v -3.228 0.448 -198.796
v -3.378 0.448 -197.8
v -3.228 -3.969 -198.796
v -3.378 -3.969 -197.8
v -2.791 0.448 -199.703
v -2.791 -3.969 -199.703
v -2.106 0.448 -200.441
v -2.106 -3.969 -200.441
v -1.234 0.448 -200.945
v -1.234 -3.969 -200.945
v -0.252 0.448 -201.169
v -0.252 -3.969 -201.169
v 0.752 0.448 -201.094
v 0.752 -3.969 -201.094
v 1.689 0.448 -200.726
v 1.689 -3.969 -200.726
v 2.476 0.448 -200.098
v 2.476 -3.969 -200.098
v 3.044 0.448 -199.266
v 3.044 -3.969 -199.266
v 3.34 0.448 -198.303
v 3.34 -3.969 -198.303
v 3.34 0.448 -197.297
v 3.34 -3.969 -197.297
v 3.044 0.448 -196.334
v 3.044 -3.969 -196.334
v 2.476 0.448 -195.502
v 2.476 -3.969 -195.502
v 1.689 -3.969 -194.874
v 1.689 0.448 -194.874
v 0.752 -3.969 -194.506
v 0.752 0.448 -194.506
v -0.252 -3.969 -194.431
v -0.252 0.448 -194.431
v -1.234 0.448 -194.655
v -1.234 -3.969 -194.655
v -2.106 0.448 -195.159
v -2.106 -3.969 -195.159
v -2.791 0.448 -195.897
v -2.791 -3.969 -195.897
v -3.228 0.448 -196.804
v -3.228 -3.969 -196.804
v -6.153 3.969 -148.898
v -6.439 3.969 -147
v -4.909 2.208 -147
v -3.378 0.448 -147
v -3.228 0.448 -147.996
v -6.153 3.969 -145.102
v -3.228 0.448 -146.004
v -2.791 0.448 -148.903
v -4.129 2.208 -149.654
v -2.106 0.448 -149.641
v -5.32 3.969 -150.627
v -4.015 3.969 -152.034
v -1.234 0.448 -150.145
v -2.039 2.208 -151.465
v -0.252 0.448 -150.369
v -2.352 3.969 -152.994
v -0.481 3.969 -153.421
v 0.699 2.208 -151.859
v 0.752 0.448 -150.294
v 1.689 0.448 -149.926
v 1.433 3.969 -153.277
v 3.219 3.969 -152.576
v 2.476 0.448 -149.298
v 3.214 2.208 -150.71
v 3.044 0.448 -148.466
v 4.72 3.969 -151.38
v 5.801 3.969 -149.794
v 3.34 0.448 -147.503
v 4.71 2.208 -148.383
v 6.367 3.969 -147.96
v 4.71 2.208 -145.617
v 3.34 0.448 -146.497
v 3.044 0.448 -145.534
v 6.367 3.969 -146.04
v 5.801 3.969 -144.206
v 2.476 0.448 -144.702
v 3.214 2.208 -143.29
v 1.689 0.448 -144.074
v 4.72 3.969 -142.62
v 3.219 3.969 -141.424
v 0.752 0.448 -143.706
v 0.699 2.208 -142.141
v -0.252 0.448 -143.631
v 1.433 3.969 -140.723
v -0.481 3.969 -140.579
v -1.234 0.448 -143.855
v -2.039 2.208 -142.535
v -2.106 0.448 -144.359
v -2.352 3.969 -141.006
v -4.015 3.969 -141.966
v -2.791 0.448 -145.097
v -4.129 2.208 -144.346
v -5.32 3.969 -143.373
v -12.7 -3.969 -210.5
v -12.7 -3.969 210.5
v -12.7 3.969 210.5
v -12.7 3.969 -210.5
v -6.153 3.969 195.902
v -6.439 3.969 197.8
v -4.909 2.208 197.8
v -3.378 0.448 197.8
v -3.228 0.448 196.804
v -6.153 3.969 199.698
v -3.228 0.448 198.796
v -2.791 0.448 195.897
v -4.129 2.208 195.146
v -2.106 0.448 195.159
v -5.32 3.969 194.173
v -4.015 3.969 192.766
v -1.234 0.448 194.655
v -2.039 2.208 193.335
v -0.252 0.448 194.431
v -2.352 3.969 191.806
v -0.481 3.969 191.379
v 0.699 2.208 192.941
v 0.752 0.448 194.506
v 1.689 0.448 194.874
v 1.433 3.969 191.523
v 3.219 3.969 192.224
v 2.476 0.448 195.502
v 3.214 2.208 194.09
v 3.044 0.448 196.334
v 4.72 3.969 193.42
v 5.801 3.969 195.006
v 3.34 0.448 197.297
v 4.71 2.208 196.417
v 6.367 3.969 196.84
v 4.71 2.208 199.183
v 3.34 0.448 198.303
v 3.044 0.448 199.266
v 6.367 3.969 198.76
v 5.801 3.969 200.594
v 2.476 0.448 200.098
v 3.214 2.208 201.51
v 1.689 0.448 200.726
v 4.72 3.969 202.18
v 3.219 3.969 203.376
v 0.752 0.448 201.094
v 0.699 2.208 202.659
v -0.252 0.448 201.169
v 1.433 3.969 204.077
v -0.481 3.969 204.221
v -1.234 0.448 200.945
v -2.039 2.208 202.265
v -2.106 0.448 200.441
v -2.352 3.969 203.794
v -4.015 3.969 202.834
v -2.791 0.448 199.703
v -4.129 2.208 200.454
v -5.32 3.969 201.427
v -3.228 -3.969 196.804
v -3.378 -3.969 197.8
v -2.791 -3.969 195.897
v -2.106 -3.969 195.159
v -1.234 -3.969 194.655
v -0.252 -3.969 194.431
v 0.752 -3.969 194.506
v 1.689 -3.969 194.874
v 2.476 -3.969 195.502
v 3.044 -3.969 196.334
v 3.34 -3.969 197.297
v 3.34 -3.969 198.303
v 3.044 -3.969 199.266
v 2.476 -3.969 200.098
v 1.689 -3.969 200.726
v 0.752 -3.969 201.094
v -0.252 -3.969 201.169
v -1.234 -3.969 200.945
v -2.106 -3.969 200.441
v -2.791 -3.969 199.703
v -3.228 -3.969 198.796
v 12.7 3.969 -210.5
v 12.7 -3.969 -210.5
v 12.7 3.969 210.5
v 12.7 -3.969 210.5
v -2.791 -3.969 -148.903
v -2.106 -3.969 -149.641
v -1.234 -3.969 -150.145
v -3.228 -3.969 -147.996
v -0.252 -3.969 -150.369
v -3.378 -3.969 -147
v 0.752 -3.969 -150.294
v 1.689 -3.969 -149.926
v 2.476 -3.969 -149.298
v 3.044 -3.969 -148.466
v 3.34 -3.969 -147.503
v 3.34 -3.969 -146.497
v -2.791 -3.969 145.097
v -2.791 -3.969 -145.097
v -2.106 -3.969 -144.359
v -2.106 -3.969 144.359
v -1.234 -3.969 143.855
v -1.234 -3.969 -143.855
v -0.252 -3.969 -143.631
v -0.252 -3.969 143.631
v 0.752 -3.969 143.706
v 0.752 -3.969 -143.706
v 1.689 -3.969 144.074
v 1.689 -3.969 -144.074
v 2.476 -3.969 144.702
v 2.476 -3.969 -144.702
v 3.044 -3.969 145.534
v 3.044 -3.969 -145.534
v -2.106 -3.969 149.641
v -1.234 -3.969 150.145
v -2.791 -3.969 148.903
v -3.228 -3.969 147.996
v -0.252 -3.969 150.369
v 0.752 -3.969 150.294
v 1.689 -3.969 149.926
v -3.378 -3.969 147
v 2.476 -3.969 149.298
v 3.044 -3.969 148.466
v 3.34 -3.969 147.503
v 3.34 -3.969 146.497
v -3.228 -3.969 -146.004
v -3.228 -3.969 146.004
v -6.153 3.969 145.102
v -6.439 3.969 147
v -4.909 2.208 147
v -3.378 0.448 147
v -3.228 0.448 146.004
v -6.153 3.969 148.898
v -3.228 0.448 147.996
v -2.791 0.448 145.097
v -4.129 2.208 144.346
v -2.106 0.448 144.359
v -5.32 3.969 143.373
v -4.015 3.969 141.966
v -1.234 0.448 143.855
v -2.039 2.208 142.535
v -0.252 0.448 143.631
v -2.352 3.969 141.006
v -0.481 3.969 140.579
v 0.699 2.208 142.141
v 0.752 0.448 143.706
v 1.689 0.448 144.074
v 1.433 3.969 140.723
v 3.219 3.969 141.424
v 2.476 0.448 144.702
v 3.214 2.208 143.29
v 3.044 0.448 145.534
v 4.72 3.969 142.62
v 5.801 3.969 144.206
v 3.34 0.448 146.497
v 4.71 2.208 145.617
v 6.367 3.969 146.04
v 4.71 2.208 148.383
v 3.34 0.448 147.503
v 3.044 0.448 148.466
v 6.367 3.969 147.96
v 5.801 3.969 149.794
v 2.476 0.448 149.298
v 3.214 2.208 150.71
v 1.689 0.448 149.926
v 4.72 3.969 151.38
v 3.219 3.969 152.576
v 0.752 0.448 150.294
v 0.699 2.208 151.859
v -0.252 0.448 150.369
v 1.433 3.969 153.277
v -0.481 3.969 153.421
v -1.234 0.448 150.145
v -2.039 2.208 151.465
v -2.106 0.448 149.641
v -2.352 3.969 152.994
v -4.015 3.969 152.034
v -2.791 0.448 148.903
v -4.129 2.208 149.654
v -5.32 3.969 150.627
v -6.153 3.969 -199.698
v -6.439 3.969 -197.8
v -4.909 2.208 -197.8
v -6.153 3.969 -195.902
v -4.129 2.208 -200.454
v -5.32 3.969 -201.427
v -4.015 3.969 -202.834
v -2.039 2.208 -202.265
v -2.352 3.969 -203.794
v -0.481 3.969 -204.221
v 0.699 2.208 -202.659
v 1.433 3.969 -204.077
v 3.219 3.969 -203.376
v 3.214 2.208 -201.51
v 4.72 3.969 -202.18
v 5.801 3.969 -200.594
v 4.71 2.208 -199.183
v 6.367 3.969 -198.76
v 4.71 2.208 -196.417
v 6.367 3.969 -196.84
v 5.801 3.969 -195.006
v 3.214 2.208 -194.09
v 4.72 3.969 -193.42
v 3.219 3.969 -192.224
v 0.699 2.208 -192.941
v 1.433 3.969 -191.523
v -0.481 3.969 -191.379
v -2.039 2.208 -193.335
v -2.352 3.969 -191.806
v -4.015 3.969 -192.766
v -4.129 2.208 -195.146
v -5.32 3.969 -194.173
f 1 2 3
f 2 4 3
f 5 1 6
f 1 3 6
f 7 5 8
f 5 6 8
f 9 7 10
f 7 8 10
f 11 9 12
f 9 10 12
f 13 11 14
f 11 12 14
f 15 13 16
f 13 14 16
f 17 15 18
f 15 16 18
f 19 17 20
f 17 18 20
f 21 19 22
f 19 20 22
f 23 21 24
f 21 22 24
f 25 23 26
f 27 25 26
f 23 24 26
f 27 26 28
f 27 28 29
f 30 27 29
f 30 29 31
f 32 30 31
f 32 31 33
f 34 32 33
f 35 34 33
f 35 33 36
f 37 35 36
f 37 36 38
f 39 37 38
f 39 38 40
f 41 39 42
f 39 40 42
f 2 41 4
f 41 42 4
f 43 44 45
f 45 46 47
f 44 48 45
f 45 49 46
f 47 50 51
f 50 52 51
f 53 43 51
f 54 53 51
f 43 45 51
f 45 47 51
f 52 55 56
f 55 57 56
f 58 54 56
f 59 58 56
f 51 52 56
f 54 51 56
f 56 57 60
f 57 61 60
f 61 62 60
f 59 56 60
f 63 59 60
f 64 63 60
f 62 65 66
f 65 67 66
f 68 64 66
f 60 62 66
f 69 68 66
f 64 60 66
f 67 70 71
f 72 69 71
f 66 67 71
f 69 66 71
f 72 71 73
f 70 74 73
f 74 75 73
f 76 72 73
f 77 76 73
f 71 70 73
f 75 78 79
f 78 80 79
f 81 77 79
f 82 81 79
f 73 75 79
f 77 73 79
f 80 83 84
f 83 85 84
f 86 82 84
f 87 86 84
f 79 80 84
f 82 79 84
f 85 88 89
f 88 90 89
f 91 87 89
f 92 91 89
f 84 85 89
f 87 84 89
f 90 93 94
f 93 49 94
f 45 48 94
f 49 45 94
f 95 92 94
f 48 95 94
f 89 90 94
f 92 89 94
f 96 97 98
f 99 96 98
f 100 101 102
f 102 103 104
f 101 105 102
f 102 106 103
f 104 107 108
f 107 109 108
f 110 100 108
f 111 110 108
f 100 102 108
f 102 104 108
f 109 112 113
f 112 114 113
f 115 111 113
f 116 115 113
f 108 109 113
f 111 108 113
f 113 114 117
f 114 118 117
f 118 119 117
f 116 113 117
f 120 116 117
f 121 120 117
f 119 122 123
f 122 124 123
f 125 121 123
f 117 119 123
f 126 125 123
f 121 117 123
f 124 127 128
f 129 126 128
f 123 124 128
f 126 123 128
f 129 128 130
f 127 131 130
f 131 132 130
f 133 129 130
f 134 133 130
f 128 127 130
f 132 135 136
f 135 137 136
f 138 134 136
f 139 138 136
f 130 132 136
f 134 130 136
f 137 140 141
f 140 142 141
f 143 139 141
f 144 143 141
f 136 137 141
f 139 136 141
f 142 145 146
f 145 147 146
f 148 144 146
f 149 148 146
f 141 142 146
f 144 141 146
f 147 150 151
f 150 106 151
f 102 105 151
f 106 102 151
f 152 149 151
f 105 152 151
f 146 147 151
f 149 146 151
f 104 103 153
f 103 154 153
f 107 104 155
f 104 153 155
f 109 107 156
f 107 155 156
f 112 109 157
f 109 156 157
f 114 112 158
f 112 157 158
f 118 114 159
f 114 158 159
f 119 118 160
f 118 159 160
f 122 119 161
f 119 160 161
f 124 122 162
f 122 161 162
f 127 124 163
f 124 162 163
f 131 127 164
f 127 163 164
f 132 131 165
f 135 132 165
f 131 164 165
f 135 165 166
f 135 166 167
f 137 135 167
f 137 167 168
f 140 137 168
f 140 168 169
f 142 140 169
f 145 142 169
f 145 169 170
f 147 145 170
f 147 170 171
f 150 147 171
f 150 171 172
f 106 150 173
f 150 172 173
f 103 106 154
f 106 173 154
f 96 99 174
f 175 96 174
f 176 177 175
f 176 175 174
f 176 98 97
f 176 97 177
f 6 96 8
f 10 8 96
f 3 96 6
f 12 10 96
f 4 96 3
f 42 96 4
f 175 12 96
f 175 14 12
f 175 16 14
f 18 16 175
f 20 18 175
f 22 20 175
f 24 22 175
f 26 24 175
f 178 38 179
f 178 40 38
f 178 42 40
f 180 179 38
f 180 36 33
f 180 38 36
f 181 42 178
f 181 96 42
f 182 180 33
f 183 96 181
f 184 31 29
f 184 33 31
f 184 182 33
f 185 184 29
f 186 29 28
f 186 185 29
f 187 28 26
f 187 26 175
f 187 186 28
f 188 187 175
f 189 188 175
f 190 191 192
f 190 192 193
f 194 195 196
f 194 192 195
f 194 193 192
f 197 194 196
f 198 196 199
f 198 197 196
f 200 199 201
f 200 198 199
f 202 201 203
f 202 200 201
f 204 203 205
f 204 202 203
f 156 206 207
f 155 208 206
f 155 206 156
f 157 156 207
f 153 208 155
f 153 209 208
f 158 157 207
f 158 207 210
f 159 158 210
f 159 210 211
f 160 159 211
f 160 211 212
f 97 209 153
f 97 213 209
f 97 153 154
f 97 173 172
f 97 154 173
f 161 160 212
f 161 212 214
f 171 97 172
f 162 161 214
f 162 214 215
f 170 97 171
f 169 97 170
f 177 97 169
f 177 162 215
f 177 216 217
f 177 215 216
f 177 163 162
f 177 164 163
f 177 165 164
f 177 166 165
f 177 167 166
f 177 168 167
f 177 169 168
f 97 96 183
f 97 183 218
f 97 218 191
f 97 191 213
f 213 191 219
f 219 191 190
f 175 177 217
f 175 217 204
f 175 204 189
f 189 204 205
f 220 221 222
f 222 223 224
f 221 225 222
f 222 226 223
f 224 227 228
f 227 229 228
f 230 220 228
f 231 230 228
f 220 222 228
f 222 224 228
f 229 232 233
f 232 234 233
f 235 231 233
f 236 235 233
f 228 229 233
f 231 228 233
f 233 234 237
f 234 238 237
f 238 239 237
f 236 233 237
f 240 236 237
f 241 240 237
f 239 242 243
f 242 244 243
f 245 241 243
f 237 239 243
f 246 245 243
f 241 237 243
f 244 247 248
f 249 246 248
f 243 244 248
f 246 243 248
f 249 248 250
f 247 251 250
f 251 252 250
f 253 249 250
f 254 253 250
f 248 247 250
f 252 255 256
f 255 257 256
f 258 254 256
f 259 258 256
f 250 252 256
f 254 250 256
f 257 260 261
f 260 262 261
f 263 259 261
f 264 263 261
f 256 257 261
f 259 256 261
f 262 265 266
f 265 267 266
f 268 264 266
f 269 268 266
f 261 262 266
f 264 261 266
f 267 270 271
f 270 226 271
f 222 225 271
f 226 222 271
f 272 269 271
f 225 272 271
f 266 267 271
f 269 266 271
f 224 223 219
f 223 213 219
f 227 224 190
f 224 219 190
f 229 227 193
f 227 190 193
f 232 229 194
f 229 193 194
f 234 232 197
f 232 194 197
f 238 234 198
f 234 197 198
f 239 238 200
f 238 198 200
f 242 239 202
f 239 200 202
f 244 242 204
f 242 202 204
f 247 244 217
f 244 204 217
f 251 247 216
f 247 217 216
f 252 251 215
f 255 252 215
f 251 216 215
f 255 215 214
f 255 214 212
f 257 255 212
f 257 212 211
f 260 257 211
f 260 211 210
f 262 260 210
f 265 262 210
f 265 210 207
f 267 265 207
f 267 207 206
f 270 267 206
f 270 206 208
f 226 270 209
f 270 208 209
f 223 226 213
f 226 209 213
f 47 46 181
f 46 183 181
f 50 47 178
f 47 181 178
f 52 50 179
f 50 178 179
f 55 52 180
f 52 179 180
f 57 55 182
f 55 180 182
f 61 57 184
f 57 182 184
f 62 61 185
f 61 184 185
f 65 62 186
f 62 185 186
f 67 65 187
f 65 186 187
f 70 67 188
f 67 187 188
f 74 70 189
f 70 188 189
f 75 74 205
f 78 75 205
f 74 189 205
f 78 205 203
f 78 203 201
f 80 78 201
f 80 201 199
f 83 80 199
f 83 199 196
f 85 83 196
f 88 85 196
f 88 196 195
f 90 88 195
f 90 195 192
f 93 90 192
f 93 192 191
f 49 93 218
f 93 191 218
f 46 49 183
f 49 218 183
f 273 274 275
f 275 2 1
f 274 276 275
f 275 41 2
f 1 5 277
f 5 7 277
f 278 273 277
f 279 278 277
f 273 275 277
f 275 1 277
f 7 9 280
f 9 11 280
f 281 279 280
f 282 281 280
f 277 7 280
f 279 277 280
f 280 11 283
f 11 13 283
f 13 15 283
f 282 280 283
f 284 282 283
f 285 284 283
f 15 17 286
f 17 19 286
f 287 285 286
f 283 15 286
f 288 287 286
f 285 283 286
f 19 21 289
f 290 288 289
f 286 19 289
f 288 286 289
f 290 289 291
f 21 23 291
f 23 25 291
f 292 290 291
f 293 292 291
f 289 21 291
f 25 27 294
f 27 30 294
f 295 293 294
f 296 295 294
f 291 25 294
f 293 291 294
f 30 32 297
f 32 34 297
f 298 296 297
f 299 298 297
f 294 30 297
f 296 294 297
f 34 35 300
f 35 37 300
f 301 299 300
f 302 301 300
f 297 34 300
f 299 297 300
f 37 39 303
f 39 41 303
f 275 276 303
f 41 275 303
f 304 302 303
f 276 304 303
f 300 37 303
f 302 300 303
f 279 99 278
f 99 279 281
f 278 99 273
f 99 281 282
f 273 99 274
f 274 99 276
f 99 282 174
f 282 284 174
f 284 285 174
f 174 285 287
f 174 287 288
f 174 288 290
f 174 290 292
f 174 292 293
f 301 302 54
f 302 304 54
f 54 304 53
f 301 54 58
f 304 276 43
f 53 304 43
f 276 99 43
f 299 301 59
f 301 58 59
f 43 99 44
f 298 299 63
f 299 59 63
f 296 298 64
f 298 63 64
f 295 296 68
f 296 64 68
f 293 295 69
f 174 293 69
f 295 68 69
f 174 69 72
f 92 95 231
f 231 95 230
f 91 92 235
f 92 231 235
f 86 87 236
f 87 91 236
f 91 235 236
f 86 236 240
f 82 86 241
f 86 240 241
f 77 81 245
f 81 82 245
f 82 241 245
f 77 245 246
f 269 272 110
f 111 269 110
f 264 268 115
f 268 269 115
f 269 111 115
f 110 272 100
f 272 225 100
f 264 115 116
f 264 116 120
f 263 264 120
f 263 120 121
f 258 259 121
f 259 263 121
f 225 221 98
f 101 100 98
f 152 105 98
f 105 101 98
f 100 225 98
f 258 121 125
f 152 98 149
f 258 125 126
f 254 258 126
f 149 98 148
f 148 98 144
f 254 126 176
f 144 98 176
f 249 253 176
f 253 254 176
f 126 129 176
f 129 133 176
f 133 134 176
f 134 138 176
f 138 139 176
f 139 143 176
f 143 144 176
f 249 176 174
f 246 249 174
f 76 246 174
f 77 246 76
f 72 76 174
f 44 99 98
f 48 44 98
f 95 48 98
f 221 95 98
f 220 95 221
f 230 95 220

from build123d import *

# Parameters (mm, degrees)
SKETCH3_W                                        = 25.4
SKETCH3_H                                        = 7.9375
BOSS_EXTRUDE1_DEPTH                              = 210.5
CSK_FOR_1_4_FLAT_HEAD_MACHINE_SCREW1_D           = 6.7564
CSK_FOR_1_4_FLAT_HEAD_MACHINE_SCREW1_CSINK_D     = 12.8778
CSK_FOR_1_4_FLAT_HEAD_MACHINE_SCREW1_CSINK_ANGLE = 82


with BuildPart() as part:
    # Sketch3 → Boss-Extrude1 (new, symmetric)
    with BuildSketch(Plane.XY):
        Rectangle(SKETCH3_W, SKETCH3_H)
    extrude(amount=BOSS_EXTRUDE1_DEPTH, both=True)

    # CSK for 1/4 Flat Head Machine Screw1 (through all)
    with Locations(Plane(origin=(0, 3.96875, 0), x_dir=(1, 0, 0), z_dir=(0, 1, 0))):
        with Locations((0, 197.8), (0, -197.8), (0, 147), (0, -147)):
            CounterSinkHole(CSK_FOR_1_4_FLAT_HEAD_MACHINE_SCREW1_D / 2, CSK_FOR_1_4_FLAT_HEAD_MACHINE_SCREW1_CSINK_D / 2, counter_sink_angle=CSK_FOR_1_4_FLAT_HEAD_MACHINE_SCREW1_CSINK_ANGLE)


solid = part.part
